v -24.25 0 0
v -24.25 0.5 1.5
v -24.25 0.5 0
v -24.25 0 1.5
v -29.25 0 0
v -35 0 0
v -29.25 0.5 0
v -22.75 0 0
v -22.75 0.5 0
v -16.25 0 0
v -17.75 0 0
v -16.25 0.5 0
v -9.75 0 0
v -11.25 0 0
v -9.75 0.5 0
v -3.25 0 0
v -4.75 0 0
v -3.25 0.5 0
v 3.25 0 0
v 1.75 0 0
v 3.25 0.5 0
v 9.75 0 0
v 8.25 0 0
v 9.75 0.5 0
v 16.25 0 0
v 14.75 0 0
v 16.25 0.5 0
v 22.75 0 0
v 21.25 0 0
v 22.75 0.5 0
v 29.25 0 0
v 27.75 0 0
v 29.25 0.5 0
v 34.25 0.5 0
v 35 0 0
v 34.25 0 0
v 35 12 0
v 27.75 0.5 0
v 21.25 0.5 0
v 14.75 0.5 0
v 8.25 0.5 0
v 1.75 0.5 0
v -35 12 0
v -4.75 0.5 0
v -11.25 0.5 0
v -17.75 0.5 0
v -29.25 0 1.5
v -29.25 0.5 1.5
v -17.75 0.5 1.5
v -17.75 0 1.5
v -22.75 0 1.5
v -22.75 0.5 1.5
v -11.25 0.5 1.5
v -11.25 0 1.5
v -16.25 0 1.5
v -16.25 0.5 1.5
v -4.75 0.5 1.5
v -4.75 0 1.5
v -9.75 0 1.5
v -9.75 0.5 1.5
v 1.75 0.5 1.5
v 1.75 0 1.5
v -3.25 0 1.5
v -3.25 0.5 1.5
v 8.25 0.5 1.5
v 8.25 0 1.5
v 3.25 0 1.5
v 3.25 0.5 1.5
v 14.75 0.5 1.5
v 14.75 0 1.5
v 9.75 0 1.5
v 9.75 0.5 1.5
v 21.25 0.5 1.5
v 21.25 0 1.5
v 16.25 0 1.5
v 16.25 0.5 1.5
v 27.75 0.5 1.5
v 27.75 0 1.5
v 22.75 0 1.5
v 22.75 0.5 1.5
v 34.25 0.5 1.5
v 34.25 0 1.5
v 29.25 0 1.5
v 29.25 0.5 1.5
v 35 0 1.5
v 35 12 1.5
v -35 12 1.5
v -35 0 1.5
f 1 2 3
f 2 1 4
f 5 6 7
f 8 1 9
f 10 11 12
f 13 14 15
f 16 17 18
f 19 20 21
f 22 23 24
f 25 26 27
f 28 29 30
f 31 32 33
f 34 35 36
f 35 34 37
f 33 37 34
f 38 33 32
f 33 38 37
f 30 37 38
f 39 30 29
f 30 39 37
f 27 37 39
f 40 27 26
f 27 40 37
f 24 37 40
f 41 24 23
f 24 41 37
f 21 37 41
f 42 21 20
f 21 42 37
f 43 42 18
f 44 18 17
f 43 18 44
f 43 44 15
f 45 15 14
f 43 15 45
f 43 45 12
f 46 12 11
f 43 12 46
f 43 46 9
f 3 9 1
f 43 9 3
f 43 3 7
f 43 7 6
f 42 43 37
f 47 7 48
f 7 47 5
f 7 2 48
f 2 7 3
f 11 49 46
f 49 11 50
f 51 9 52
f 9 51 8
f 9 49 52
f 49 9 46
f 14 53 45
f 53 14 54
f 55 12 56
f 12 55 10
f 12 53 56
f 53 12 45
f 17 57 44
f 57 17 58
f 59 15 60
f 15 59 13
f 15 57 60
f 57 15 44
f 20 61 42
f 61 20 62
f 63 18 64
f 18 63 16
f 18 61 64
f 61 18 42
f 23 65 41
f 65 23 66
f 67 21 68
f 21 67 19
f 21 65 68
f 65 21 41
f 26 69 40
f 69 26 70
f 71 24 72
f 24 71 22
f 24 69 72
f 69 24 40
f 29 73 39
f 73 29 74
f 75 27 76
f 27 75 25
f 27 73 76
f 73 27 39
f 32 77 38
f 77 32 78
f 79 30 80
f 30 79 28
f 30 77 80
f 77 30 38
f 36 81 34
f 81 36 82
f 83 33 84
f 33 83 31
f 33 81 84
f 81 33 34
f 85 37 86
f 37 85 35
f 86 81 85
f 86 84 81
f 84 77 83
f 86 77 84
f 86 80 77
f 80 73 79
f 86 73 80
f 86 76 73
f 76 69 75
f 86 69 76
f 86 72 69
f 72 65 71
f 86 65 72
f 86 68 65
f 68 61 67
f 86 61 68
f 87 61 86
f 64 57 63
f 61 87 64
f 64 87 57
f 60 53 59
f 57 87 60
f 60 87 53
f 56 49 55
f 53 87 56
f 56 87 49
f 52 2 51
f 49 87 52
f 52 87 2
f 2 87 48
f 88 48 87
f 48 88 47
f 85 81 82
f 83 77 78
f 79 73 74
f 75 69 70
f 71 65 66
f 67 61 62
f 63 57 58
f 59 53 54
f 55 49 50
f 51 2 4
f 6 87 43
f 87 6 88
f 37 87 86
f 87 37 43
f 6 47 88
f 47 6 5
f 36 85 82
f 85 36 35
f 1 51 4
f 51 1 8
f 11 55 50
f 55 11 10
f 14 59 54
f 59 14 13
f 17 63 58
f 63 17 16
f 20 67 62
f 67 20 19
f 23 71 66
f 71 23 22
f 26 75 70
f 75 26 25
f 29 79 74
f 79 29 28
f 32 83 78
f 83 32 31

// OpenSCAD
// 10-well agarose gel comb - printed lying flat
// Units: mm

plate_t      = 1.5;   // plate thickness (Z)
spine_l      = 70;    // spine length (X)
spine_w      = 12;    // spine width (Y)
teeth_n      = 10;    // number of teeth
teeth_w      = 5;     // tooth width (X)
teeth_l      = 12;    // tooth length (Y)
teeth_gap    = 1.5;   // gap between teeth (X)
overcut      = 0.5;   // cutter overshoot past faces

$fn = 64;

pitch = teeth_w + teeth_gap;
x0    = -(teeth_n - 1) * pitch / 2;   // first tooth centre X

difference() {
    // Spine
    translate([-spine_l / 2, 0, 0])
        cube([spine_l, spine_w, plate_t]);

    // Teeth hanging in -Y
    for (i = [0 : teeth_n - 1])
        translate([x0 + i * pitch, -teeth_l, 0])
            cube([teeth_w, teeth_l + overcut, plate_t + overcut]);
}
